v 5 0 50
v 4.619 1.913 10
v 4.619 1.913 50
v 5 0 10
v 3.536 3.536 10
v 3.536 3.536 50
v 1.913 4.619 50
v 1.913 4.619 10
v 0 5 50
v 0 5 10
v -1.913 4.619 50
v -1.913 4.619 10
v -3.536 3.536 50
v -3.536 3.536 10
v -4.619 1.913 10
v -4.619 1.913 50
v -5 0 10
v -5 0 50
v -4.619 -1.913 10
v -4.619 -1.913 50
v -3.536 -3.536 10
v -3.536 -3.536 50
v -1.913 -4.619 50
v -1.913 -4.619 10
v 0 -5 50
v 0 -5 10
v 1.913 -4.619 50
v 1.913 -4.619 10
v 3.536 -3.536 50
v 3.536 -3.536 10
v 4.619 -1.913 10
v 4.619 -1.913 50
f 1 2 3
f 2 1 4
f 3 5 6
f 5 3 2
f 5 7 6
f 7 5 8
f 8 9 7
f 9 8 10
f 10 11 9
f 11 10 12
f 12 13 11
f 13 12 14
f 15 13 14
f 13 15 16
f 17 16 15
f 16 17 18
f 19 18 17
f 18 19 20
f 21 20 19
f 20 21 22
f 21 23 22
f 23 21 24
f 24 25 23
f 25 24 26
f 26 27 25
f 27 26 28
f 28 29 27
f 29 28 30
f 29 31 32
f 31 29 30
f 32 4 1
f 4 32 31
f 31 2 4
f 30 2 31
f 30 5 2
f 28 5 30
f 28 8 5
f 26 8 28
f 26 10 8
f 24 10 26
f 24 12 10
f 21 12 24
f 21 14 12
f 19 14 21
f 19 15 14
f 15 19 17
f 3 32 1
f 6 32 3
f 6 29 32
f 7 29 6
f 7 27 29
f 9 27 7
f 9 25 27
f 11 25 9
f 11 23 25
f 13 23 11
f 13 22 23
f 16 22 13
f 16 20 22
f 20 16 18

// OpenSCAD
// Upload your image flile
image_file = "test.dxf"; // [image_surface:100x100]

/*[basic settings]*/
// set the position of the handle (depends on the picture colour, so you have to set it manually!
offset = 30;
// handle radius in mm
radius = 5;
//handle height in mm
handle_height= 40;
/*[Image cutter]*/
//set the factor for the cutouts
cut = 2;
//set the height of the cutter tool(not autmatic unless you download it and follow the instructions in the description)
height = 5;
/*[Hidden]*/

translate([0, 0, 0]) scale([1,1,cut]) surface(file=image_file, center=true, convexity=10);
translate([0,0,offset]) cylinder(r1 = radius,r2 = radius, h = handle_height, center = true);
